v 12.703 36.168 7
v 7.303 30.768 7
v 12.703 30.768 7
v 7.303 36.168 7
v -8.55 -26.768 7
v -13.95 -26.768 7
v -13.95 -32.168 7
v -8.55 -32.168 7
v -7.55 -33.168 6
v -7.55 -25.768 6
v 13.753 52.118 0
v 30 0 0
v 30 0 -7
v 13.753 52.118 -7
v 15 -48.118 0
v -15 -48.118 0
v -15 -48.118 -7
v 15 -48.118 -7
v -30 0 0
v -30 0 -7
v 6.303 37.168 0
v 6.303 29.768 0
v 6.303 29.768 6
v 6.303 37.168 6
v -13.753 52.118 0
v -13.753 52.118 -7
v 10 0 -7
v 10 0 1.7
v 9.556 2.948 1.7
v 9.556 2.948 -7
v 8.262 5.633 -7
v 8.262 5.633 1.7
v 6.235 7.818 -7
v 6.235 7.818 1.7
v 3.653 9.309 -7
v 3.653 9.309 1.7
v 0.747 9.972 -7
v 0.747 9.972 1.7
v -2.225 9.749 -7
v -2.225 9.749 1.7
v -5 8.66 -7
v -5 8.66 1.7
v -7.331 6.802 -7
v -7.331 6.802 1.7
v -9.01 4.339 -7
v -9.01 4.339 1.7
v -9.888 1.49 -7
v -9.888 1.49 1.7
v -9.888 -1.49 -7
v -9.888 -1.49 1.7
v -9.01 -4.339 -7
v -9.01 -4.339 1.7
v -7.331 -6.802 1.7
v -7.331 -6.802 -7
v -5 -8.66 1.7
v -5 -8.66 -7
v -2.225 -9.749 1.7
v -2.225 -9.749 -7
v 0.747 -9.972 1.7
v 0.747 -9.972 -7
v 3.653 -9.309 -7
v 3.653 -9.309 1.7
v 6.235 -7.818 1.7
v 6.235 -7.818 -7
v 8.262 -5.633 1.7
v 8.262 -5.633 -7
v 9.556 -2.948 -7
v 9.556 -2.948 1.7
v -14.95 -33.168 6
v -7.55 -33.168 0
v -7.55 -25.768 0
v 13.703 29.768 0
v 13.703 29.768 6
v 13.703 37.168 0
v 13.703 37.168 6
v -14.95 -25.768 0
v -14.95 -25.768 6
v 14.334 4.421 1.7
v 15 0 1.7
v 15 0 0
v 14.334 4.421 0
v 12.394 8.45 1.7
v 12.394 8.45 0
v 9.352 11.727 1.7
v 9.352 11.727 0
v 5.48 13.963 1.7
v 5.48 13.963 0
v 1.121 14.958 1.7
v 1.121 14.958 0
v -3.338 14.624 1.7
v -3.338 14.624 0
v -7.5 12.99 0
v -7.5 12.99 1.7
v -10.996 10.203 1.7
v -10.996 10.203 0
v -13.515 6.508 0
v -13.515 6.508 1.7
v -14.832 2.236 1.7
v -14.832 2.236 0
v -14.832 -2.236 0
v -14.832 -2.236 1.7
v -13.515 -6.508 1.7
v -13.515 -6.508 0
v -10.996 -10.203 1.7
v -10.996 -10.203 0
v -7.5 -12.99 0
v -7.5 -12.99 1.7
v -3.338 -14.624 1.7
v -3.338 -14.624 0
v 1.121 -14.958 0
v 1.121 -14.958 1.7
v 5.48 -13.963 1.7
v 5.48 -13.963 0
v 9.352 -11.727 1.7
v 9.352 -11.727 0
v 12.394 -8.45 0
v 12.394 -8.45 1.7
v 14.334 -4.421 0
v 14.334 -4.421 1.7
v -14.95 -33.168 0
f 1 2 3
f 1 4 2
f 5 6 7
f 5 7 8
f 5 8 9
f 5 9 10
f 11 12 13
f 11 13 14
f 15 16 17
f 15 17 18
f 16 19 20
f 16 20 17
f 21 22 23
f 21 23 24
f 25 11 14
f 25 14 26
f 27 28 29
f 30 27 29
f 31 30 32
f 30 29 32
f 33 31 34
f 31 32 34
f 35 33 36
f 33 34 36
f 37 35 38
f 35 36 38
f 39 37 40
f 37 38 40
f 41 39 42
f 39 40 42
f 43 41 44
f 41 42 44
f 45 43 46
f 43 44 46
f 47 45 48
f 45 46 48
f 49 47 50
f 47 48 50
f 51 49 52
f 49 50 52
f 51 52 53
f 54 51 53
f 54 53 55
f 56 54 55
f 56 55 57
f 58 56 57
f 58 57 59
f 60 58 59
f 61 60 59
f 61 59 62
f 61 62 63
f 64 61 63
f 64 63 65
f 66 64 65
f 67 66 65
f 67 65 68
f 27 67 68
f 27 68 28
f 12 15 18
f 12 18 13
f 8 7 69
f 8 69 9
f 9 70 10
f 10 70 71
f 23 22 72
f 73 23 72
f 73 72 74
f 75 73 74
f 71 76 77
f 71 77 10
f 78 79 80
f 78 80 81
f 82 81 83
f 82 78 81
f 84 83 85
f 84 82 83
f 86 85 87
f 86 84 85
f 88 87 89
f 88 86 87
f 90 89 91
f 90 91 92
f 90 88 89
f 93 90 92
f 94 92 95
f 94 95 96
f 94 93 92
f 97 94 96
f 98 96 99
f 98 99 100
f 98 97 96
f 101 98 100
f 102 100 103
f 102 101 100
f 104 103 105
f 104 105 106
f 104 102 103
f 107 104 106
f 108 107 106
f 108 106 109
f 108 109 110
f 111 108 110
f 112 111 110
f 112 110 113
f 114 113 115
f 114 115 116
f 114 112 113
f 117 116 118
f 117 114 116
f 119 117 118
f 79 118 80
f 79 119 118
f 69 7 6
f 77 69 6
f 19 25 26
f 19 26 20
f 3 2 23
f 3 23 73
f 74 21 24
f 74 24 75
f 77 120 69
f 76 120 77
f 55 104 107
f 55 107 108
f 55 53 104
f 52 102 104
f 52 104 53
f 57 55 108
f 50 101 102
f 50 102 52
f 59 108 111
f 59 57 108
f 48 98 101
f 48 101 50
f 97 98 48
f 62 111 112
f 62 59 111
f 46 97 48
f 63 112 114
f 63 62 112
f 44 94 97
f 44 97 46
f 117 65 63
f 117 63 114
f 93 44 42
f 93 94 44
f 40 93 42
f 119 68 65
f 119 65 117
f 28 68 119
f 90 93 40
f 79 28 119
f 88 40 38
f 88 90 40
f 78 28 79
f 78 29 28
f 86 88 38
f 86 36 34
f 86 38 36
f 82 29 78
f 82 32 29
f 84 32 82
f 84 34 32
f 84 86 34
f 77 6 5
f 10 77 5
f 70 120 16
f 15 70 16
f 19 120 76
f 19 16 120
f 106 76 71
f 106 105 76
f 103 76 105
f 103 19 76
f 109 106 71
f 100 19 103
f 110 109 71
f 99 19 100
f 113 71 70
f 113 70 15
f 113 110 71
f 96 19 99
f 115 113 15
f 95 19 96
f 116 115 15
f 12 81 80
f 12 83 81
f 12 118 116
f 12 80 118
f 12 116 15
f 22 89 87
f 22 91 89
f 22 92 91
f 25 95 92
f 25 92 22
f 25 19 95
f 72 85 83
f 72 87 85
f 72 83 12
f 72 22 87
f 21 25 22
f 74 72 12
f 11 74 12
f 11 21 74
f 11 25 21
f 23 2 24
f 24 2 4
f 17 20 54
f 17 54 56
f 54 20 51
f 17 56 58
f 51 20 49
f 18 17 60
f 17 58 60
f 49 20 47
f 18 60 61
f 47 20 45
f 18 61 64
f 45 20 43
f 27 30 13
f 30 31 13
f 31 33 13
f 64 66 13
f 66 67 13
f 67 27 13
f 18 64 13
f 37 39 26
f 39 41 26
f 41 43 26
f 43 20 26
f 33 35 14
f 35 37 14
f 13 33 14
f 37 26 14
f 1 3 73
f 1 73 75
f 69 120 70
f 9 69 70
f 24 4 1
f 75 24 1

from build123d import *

# Parameters (mm, degrees)
SKETCH1_R           = 10
BOSS_EXTRUDE1_DEPTH = 7
SKETCH1_3_W         = 7.4
SKETCH1_3_H         = 7.4
BOSS_EXTRUDE2_DEPTH = 7
CHAMFER1_SIZE       = 1
BOSS_EXTRUDE3_START = 1.7
SKETCH1_4_R         = 15
SKETCH1_4_R_2       = 10
BOSS_EXTRUDE3_DEPTH = 1.7


with BuildPart() as part:
    # Sketch1 → Boss-Extrude1 (new body)
    with BuildSketch(Plane.XY):
        Polygon((-30, 0), (-15, -48.118283633), (15, -48.118283633), (30, 0), (13.753072731, 52.118283633), (-13.753072731, 52.118283633), align=None)
        Circle(SKETCH1_R, mode=Mode.SUBTRACT)
    extrude(amount=-BOSS_EXTRUDE1_DEPTH)

    # Sketch1<3> → Boss-Extrude2 (add)
    with BuildSketch(Plane.XY):
        with Locations((-11.25, -29.468283633)):
            Rectangle(SKETCH1_3_W, SKETCH1_3_H)
        with Locations((10.003072731, 33.468283633)):
            Rectangle(SKETCH1_3_W, SKETCH1_3_H)
    extrude(amount=BOSS_EXTRUDE2_DEPTH)

    # Chamfer1
    chamfer1_edges = [part.edges().sort_by_distance(p)[0] for p in [
        (-11.25, -25.768283633, 7),
        (-14.95, -29.468283633, 7),
        (-11.25, -33.168283633, 7),
        (-7.55, -29.468283633, 7),
        (10.003072731, 29.768283633, 7),
        (13.703072731, 33.468283633, 7),
        (10.003072731, 37.168283633, 7),
        (6.303072731, 33.468283633, 7),
    ]]
    chamfer(chamfer1_edges, length=CHAMFER1_SIZE)

    # Sketch1<4> → Boss-Extrude3 (add)
    with BuildSketch(Plane.XY.offset(BOSS_EXTRUDE3_START)):
        Circle(SKETCH1_4_R)
        Circle(SKETCH1_4_R_2, mode=Mode.SUBTRACT)
    extrude(amount=-BOSS_EXTRUDE3_DEPTH)


solid = part.part
